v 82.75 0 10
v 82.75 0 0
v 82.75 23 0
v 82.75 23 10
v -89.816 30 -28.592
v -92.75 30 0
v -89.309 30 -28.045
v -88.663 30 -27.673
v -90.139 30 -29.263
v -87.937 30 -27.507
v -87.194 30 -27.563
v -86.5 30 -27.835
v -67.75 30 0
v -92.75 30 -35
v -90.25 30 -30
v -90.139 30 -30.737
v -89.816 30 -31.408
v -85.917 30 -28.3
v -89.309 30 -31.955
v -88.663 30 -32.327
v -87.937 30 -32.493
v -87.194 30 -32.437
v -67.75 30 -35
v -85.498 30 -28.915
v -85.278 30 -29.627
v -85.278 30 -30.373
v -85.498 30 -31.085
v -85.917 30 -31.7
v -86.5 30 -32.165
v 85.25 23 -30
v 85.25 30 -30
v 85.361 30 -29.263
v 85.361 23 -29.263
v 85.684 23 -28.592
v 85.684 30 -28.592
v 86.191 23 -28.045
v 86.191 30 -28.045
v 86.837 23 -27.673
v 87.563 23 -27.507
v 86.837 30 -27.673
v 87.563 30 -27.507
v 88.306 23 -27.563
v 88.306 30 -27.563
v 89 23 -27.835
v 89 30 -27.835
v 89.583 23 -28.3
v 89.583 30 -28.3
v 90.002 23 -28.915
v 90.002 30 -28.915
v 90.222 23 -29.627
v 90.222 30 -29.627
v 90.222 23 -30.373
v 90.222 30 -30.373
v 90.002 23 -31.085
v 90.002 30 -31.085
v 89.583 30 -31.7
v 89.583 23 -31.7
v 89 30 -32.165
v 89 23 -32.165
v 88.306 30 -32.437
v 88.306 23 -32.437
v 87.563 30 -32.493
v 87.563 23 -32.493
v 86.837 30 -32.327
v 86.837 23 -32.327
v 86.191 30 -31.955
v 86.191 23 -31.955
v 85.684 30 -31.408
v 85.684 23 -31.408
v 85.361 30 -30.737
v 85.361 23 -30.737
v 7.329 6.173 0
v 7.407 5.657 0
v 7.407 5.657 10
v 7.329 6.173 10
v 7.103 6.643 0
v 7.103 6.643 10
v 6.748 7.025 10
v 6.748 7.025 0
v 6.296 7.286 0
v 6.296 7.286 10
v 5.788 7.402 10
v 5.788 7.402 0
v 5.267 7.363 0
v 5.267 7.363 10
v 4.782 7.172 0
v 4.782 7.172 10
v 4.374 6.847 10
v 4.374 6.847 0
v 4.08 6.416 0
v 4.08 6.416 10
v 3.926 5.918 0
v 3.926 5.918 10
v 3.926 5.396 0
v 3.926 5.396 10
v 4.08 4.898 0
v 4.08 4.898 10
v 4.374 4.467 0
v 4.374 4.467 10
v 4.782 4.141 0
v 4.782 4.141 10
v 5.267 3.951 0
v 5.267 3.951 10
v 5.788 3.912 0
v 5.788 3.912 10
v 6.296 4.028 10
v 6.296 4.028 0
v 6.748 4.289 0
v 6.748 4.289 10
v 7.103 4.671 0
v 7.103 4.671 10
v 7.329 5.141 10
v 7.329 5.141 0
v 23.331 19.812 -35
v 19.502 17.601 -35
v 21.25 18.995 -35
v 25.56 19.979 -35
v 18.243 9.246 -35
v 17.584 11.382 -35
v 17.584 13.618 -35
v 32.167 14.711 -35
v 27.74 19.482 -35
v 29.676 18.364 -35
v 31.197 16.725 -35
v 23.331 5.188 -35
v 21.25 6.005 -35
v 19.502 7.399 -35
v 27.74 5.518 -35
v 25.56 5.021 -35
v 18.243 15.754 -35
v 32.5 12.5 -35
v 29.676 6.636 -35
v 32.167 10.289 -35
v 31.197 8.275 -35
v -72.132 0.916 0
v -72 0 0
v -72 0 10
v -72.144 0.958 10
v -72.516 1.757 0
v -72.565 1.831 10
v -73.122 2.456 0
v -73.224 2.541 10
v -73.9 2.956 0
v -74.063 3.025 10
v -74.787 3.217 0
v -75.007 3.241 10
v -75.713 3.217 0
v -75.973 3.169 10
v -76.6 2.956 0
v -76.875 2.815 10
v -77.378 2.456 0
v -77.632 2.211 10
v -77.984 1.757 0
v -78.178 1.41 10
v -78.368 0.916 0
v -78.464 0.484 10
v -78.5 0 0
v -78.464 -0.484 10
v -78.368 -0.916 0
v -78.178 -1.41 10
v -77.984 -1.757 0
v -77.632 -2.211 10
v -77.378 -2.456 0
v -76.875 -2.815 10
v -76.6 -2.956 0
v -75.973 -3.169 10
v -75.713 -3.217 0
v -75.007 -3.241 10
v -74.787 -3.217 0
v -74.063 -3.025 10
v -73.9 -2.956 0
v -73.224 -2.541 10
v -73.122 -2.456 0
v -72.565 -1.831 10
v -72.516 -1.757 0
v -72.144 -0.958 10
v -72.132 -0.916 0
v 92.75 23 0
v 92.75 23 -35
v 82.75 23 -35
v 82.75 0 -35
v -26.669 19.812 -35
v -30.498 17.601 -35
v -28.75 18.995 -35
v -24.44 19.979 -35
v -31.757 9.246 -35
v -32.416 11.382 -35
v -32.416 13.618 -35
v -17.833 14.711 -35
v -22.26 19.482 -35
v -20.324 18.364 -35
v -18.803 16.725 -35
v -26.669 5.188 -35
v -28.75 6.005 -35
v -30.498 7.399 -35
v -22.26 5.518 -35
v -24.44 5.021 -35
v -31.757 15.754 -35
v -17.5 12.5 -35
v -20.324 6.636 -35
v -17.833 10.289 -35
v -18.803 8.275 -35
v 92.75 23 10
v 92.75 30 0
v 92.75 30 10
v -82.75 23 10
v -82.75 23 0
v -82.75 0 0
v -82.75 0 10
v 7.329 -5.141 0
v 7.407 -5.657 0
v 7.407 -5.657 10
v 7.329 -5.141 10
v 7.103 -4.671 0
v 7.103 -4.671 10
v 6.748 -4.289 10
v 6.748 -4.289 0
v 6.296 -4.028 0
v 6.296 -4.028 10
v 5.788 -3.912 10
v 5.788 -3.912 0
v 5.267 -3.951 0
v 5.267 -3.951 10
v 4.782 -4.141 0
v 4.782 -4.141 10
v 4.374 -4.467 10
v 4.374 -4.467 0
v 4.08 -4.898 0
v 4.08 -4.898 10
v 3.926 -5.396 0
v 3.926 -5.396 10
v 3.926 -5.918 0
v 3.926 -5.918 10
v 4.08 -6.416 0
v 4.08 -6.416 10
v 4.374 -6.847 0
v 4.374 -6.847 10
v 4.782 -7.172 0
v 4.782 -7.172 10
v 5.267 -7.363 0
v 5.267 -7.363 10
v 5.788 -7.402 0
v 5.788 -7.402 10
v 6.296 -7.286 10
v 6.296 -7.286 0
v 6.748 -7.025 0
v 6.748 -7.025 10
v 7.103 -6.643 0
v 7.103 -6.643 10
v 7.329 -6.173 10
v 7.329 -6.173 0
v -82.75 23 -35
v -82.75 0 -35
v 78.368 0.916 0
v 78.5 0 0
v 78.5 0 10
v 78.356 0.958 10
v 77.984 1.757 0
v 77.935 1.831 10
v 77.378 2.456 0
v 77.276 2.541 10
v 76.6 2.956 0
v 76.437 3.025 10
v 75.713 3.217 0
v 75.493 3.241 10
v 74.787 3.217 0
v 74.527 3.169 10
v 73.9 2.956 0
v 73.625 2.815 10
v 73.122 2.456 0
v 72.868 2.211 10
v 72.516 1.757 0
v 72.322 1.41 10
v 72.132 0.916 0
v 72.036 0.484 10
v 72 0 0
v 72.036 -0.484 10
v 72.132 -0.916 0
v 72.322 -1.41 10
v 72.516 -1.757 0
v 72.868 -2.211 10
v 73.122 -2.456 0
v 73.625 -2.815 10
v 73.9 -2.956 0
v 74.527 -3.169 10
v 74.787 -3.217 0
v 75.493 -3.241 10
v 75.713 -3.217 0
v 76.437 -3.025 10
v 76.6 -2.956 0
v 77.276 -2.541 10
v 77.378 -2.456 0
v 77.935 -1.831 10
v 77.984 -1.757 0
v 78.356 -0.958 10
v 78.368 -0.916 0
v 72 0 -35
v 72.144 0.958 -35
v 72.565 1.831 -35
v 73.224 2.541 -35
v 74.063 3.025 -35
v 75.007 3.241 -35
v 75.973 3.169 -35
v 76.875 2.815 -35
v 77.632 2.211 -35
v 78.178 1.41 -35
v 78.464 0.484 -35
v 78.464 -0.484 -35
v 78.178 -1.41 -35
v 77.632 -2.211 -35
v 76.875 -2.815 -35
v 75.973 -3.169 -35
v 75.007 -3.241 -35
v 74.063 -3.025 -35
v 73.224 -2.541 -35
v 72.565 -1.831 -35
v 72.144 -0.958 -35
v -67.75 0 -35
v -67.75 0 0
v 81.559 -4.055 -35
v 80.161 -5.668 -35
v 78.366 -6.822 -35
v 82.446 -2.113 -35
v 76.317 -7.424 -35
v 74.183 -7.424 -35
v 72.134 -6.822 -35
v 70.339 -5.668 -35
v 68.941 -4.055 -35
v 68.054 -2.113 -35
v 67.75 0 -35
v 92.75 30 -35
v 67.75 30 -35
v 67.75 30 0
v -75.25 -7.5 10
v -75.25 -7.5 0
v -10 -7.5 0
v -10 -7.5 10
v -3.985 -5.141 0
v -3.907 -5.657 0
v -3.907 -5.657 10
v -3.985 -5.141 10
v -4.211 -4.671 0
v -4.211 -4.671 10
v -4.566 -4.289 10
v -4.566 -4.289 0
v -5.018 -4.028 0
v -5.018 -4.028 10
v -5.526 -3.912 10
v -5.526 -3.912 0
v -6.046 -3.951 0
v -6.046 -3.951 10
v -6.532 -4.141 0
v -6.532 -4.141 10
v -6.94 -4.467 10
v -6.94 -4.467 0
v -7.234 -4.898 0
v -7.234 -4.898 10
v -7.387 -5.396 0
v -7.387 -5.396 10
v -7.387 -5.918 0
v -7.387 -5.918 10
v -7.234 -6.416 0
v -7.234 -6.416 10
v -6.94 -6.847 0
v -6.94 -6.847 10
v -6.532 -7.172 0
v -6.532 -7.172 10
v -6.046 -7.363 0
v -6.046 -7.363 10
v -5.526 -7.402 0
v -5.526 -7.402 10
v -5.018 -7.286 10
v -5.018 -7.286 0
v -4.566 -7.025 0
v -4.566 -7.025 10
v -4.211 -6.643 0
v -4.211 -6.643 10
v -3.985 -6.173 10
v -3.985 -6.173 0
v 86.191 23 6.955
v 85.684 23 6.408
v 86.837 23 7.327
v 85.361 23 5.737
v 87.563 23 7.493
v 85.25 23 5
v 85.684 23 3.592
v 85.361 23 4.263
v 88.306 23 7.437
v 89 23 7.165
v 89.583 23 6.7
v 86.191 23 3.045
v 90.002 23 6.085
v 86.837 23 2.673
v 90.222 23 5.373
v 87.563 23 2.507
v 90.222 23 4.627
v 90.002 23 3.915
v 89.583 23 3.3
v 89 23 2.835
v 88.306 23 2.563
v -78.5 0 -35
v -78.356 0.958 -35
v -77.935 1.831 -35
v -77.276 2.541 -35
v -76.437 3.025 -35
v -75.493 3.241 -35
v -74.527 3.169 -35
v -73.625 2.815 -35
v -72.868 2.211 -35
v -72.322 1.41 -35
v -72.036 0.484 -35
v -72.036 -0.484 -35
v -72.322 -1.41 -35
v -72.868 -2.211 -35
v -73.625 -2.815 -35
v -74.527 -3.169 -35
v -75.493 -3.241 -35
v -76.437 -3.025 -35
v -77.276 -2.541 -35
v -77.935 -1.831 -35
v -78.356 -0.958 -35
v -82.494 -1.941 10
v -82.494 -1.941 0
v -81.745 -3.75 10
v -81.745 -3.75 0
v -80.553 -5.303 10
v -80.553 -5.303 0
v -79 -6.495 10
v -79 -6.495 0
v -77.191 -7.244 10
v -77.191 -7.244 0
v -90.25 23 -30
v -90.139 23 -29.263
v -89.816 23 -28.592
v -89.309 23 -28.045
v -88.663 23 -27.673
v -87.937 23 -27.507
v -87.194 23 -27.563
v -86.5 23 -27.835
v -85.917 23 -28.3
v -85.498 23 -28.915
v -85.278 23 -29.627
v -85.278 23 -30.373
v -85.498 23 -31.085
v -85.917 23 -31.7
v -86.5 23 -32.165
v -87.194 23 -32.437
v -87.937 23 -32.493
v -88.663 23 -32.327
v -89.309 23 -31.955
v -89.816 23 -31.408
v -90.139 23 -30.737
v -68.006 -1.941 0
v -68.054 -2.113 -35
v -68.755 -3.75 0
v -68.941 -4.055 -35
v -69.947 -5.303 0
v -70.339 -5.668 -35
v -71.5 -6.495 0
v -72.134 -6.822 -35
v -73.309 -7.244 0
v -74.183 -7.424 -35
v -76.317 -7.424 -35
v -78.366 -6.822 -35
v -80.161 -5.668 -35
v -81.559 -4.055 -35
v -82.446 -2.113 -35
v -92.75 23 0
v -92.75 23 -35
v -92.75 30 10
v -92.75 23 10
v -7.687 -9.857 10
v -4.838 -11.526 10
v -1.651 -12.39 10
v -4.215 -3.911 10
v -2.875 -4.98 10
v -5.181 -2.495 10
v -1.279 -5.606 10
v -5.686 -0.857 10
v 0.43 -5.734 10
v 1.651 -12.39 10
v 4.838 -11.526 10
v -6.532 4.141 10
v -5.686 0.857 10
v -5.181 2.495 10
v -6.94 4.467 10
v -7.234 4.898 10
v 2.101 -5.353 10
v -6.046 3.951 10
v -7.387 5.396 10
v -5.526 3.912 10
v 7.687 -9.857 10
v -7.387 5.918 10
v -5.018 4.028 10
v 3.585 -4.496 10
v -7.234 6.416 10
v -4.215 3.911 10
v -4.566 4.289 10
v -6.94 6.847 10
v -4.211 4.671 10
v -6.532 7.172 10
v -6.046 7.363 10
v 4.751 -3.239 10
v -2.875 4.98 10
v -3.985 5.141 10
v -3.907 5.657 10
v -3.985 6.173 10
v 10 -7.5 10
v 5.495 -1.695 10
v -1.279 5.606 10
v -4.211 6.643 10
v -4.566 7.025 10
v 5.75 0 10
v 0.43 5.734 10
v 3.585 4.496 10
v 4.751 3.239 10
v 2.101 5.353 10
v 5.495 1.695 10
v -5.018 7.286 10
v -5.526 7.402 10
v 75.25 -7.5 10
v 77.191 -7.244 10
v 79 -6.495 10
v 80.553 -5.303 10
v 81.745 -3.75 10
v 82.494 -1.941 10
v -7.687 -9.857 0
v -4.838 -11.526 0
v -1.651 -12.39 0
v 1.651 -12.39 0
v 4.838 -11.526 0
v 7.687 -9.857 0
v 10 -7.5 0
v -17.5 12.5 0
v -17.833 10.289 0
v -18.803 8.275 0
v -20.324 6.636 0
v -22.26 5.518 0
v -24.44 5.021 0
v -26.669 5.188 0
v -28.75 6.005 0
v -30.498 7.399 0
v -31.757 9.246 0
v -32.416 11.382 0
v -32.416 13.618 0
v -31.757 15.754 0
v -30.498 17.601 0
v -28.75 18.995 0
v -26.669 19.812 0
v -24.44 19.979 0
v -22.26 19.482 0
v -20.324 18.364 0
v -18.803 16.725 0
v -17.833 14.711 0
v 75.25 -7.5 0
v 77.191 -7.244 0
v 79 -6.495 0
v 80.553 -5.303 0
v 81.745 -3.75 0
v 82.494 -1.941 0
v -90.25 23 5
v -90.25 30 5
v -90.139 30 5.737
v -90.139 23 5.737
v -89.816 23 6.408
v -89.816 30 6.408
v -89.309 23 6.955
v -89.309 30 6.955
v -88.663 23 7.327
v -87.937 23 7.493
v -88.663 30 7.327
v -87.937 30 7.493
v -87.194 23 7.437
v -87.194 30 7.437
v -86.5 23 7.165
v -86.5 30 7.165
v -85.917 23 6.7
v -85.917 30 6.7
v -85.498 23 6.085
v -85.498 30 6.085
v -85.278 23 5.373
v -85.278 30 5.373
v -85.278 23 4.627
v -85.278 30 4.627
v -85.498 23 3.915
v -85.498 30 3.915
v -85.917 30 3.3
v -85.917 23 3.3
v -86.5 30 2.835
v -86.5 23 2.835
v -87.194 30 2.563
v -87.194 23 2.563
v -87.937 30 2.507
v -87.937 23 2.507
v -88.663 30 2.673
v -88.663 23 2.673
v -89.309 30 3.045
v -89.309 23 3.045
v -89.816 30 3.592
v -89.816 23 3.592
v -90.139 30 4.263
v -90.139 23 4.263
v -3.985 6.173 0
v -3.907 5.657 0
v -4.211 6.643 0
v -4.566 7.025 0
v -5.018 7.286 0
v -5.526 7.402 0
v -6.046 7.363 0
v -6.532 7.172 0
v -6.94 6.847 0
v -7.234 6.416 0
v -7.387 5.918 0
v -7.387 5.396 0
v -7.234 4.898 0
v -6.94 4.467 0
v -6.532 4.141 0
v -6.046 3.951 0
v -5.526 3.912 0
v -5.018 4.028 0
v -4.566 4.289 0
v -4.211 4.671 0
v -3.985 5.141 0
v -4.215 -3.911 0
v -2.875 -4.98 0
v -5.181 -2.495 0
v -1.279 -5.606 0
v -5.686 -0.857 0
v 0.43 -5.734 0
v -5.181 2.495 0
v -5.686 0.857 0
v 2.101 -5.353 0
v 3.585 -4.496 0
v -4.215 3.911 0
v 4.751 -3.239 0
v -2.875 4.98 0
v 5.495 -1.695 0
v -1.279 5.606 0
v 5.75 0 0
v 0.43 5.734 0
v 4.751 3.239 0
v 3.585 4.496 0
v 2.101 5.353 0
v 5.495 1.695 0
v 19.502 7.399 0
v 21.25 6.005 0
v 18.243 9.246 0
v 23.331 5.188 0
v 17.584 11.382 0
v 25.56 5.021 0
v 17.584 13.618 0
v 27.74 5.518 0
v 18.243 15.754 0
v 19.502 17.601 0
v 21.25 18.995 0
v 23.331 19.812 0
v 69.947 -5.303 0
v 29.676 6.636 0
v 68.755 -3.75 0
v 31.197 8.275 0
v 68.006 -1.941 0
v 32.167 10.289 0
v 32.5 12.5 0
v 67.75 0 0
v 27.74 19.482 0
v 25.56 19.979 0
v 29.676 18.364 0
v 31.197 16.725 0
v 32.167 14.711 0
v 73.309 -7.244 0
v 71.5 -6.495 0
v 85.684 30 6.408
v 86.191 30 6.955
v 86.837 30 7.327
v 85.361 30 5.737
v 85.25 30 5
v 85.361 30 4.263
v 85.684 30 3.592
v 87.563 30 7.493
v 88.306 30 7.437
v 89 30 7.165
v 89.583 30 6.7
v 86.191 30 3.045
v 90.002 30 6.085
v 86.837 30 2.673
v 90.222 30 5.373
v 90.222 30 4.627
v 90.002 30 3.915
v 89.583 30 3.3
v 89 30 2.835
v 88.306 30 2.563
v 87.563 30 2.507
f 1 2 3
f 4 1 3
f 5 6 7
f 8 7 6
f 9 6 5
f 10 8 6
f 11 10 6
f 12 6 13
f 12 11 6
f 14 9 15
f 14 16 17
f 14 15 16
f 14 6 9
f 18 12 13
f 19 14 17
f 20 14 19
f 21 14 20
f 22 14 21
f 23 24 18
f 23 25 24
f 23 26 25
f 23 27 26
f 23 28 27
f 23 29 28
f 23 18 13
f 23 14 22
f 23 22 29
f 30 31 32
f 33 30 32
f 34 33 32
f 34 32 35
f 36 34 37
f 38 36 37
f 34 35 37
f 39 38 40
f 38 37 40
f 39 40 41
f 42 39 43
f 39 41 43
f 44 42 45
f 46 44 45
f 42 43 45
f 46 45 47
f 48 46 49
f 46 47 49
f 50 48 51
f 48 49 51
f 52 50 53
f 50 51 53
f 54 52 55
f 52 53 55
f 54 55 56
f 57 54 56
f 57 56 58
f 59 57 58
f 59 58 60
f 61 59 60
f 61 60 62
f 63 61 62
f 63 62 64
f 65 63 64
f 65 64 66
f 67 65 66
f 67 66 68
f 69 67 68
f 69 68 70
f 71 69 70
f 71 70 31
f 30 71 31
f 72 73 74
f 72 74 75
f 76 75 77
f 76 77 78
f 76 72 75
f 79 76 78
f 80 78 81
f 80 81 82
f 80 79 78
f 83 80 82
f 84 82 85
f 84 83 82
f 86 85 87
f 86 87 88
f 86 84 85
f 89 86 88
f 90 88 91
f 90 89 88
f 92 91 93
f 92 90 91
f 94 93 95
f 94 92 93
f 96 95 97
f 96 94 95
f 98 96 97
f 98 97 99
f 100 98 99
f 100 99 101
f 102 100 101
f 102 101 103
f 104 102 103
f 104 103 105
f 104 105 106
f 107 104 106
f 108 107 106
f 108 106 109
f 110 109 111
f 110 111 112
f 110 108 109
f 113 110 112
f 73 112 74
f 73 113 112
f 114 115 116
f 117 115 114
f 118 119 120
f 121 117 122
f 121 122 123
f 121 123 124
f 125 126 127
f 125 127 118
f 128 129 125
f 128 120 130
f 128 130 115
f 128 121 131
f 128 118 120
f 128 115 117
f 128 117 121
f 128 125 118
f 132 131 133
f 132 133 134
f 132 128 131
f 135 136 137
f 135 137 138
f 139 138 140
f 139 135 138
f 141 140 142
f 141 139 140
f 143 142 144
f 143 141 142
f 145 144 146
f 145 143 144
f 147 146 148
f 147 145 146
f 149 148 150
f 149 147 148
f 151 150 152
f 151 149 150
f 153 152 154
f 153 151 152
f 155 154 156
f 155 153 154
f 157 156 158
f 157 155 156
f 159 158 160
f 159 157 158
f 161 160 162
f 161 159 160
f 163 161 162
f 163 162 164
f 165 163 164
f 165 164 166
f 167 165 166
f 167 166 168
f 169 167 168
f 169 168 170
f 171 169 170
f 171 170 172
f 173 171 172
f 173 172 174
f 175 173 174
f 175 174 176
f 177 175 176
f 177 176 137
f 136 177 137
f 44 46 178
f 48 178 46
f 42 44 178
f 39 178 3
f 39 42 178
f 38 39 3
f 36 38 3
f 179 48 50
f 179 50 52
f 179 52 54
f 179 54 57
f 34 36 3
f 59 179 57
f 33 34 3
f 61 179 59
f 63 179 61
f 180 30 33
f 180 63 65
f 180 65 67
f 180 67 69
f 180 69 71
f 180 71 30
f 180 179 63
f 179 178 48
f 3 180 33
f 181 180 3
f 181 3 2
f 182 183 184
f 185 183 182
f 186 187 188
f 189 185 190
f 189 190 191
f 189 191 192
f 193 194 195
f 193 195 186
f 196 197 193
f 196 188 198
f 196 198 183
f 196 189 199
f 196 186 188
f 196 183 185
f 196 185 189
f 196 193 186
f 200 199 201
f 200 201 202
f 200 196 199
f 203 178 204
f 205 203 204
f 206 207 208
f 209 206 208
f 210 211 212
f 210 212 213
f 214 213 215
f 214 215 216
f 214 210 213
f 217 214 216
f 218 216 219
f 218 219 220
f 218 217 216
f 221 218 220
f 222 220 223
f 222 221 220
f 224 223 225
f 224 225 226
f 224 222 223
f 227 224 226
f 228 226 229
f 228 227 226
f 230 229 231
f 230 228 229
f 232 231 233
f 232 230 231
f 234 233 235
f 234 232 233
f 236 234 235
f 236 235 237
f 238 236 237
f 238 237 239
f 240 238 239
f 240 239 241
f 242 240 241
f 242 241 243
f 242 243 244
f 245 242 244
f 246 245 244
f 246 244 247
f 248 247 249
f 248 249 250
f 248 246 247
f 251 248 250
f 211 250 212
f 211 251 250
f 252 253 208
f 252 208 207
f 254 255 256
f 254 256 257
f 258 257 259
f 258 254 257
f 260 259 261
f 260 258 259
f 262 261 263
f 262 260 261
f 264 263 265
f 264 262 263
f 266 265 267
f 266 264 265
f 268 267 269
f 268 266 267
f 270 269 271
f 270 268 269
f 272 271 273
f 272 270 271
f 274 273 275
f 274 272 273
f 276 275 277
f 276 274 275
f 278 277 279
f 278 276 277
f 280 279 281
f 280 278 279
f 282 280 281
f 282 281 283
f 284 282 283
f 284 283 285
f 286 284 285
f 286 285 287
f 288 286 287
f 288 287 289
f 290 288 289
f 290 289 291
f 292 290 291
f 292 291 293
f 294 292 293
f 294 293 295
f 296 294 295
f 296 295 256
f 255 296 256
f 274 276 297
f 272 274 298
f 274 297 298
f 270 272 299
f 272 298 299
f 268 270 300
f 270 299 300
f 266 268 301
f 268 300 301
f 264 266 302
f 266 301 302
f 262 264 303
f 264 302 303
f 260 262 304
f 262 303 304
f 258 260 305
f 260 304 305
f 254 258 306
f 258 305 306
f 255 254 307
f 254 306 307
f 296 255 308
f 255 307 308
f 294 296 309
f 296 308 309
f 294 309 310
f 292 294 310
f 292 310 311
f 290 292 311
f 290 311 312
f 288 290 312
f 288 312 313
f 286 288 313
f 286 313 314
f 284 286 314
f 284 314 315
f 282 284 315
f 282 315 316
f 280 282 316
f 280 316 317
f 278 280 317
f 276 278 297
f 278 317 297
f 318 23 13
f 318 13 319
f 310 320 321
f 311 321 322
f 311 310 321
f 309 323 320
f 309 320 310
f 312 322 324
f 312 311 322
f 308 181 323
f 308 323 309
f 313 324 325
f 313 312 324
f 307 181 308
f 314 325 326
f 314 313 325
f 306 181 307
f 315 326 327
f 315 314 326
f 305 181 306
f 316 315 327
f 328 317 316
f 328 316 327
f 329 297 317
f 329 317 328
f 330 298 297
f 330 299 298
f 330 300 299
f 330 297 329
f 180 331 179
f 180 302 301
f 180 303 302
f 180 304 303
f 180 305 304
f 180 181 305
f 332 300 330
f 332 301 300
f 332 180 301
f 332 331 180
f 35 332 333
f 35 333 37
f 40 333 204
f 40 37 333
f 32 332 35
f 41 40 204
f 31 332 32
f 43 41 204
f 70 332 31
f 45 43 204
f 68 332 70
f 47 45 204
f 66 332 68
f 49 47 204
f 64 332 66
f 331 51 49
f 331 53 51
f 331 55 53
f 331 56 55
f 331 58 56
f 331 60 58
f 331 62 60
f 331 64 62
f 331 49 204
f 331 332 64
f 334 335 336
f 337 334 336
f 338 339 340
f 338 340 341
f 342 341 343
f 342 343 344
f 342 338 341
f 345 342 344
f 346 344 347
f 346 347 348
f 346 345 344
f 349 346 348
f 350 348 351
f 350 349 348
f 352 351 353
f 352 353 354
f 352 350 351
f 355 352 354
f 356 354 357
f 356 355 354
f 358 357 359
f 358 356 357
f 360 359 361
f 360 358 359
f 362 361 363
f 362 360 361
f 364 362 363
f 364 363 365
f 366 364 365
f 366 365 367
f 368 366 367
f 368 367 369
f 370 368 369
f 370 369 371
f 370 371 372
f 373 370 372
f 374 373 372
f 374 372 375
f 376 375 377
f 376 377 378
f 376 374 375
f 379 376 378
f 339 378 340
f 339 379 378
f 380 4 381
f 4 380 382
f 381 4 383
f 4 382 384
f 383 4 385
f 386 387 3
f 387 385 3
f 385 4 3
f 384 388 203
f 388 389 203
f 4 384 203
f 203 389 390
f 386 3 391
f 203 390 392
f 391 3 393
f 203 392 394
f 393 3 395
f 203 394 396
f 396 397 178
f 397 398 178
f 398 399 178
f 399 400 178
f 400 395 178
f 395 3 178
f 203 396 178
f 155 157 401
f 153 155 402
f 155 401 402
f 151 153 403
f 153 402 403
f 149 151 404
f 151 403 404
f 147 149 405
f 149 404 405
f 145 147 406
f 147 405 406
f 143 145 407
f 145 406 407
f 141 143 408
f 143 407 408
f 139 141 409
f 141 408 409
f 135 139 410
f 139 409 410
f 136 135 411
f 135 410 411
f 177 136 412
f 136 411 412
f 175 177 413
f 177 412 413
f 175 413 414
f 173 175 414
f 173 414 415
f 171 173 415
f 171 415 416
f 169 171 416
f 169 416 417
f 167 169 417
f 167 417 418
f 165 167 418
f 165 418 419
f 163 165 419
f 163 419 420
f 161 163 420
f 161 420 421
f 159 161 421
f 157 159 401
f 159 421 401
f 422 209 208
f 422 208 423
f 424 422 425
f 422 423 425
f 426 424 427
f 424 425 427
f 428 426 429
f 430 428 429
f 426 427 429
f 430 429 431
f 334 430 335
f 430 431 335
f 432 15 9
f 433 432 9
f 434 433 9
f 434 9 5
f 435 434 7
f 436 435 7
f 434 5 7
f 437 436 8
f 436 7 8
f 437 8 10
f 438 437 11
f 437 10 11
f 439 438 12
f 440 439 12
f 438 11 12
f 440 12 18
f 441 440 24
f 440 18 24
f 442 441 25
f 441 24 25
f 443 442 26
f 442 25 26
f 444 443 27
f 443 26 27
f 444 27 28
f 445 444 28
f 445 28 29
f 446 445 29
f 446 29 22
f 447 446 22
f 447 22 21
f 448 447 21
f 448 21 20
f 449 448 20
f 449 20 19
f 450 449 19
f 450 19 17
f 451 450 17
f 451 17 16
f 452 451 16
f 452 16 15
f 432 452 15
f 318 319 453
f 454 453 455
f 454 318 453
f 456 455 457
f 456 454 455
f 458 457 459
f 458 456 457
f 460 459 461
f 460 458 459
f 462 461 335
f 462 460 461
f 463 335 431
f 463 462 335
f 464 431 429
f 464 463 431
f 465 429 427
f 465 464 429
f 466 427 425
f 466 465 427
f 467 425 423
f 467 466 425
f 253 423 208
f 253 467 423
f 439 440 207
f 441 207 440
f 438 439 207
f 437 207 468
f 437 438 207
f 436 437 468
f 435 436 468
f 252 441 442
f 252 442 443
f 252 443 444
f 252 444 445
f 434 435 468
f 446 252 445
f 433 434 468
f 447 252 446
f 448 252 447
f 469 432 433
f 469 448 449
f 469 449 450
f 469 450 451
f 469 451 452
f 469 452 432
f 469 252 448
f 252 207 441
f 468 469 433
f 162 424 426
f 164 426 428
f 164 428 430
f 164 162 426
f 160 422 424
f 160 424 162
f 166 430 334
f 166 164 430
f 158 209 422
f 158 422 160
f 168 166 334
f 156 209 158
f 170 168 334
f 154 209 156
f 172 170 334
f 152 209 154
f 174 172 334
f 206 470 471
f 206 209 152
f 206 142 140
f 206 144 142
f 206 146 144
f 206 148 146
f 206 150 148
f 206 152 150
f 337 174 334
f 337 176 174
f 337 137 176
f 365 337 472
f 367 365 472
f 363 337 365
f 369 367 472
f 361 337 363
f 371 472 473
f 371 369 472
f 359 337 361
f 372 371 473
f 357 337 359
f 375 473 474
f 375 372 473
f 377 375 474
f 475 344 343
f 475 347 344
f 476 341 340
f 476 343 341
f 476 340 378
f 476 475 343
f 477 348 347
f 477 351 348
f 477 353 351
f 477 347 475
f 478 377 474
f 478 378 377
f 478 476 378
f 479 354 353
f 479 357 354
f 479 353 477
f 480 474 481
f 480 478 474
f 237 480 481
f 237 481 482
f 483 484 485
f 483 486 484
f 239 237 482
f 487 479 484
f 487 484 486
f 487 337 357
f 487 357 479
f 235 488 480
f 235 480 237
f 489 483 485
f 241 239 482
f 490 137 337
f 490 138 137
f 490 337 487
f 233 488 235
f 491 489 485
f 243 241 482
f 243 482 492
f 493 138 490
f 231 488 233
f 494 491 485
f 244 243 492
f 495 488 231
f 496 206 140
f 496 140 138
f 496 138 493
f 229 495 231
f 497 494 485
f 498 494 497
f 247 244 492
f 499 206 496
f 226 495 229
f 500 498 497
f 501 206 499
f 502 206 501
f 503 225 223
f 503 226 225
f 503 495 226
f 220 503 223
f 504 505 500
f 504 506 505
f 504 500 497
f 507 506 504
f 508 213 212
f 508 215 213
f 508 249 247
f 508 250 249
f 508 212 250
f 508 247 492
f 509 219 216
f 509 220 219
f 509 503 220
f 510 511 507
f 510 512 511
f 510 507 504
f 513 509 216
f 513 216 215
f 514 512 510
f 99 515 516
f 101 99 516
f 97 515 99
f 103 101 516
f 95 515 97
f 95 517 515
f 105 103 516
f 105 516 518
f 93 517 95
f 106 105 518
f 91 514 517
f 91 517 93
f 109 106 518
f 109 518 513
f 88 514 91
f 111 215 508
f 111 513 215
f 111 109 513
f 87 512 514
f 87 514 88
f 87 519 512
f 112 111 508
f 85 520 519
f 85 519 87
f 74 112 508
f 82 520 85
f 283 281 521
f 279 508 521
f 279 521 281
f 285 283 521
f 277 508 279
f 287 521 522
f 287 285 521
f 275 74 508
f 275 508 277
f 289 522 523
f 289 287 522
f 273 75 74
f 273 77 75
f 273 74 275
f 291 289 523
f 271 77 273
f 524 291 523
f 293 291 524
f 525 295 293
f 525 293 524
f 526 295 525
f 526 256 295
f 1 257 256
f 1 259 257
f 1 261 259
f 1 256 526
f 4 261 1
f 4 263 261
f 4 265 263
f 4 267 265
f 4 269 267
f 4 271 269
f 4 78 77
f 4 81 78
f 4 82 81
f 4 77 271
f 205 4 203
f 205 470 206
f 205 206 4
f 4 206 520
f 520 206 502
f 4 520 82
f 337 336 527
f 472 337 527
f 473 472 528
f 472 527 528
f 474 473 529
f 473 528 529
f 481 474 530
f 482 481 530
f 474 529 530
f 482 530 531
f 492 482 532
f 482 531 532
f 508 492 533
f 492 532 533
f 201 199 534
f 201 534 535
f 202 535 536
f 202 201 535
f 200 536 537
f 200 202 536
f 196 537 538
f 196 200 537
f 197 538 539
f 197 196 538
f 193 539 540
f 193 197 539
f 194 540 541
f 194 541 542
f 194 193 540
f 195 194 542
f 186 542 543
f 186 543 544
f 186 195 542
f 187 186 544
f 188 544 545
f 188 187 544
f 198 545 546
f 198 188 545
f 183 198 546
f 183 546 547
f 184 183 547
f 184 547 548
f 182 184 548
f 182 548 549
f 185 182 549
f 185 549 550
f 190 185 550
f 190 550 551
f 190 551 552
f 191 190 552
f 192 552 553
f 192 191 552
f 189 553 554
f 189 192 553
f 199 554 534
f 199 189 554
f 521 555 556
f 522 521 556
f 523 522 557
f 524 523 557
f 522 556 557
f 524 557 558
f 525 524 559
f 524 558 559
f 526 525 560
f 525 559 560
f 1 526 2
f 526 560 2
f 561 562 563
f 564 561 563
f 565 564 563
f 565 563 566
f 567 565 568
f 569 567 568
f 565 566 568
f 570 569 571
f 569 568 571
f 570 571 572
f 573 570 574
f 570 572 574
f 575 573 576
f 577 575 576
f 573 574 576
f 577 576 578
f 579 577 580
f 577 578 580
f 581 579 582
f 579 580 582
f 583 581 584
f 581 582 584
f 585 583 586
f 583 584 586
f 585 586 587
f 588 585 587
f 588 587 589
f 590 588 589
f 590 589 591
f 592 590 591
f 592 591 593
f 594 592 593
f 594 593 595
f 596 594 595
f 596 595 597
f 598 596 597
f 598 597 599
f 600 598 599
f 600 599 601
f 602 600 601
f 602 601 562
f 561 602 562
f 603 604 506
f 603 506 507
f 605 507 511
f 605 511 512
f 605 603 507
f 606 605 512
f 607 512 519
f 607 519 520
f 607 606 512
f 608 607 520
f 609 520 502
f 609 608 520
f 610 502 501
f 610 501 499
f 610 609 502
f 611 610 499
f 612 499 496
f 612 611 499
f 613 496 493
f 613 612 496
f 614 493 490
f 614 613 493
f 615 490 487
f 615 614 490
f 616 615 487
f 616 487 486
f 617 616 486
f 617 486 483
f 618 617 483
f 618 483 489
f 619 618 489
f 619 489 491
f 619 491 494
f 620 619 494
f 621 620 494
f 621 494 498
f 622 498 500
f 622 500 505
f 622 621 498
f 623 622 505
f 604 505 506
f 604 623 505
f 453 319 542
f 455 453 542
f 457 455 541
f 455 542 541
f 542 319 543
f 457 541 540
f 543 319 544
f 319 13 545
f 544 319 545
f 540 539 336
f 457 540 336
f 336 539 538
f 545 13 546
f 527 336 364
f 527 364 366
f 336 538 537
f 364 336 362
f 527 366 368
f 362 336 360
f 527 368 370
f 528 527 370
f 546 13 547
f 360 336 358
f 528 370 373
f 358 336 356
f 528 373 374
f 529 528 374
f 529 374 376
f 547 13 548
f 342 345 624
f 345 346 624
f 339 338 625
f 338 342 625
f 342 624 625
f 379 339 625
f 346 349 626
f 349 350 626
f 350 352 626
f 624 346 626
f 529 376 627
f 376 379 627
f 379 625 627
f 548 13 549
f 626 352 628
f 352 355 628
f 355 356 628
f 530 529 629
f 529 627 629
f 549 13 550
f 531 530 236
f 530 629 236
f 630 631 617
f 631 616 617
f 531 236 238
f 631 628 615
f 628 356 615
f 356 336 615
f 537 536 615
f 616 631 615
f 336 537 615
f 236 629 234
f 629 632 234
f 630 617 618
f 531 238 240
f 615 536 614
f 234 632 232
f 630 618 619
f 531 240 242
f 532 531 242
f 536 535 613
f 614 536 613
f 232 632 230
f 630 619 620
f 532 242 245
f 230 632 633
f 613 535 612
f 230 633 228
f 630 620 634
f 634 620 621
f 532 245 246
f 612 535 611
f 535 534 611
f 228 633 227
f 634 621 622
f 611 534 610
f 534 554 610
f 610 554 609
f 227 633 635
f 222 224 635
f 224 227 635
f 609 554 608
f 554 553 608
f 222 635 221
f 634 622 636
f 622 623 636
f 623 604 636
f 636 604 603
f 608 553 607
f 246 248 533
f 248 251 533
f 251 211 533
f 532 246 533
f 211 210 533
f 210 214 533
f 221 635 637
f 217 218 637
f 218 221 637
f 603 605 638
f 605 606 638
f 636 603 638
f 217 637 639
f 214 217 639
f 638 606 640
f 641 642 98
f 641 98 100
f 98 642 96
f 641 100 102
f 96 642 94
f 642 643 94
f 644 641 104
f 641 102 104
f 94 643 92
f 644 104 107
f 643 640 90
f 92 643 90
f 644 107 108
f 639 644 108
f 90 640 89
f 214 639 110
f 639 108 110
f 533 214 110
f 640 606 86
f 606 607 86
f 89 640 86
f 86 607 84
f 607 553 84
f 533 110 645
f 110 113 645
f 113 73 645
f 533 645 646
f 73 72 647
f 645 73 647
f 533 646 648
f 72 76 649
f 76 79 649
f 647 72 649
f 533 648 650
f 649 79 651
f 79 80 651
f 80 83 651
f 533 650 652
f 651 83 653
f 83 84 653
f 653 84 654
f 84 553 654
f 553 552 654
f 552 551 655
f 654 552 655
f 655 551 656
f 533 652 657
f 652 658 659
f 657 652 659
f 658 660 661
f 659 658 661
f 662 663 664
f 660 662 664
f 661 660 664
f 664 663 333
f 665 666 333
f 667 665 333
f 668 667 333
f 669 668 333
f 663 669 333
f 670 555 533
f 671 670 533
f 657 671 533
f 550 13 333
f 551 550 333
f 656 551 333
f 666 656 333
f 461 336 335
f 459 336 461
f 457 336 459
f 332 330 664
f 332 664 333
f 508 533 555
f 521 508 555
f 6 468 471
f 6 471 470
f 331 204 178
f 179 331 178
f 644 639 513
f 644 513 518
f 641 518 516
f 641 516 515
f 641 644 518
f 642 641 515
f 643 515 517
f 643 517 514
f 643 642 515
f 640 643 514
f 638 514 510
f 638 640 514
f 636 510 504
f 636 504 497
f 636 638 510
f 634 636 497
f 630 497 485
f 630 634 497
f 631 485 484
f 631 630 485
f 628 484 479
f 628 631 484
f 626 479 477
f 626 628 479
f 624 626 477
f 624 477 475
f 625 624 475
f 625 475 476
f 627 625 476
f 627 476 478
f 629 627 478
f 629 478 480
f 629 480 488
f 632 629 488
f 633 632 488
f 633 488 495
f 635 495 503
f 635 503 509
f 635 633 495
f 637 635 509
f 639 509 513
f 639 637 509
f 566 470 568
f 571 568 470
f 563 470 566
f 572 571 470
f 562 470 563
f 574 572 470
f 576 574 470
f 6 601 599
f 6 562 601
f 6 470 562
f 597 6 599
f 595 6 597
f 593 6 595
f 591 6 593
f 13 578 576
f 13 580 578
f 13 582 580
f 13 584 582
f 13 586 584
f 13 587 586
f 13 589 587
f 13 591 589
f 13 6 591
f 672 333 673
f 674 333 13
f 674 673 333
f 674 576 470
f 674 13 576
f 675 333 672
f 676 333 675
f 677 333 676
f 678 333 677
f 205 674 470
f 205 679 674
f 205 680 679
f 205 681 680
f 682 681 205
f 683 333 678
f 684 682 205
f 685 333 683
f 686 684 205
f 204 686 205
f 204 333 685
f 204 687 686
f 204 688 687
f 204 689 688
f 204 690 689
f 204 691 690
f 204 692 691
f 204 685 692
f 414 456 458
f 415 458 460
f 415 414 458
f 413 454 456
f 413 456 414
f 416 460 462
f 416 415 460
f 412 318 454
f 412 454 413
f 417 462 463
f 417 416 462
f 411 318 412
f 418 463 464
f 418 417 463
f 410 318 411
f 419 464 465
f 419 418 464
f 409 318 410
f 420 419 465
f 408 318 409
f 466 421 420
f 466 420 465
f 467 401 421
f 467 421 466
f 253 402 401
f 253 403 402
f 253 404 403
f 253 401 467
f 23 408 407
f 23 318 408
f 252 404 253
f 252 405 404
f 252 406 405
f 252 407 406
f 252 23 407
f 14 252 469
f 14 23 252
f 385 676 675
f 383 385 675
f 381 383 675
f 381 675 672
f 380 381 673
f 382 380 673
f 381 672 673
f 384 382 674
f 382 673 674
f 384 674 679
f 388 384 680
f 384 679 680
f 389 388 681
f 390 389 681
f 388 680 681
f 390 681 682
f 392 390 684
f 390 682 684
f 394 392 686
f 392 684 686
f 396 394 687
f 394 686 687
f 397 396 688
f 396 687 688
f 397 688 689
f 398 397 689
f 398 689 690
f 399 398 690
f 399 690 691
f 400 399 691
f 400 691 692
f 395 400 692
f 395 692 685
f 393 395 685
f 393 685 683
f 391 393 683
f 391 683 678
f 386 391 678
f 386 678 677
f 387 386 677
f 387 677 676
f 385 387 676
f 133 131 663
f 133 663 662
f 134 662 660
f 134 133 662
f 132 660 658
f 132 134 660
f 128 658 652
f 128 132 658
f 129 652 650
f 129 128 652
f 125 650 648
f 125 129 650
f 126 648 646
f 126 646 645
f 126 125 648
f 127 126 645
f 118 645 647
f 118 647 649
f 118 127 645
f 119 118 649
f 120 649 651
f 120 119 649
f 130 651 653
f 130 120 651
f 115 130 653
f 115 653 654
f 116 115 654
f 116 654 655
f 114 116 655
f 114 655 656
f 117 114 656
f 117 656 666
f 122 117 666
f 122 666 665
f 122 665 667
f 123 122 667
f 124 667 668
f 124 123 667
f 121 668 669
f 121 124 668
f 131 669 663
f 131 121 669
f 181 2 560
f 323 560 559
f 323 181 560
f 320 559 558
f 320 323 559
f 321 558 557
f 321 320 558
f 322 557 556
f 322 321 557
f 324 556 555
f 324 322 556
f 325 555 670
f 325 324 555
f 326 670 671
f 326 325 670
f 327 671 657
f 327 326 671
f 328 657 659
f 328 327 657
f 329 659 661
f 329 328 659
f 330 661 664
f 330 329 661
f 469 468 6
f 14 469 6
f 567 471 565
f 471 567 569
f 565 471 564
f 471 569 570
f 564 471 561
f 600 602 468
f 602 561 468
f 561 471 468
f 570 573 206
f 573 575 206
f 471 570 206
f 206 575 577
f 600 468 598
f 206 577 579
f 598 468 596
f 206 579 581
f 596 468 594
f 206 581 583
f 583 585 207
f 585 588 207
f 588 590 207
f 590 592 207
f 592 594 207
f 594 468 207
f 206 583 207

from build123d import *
from build123d.topology import SkipClean

# Parameters (mm, degrees)
SKETCH1_R           = 12.5
SKETCH1_R_2         = 1.75
SKETCH1_R_3         = 5.75
SKETCH1_R_4         = 7.5
SKETCH1_R_5         = 3.25
SKETCH1_W           = 10
SKETCH1_H           = 7
BOSS_EXTRUDE1_DEPTH = 10
BOSS_EXTRUDE2_START = 35
SKETCH2_R           = 3.25
SKETCH2_R_2         = 7.5
BOSS_EXTRUDE2_DEPTH = 35
SKETCH3_R           = 2.5
CUT_EXTRUDE1_DEPTH  = 35


with BuildPart() as part:
    # Sketch1 → Boss-Extrude1 (new body)
    # profile 1 of 8: a face of its own
    with BuildSketch(Plane.XY):
        with BuildLine():
            Line((-12.5, 30), (-12.5, 0))
            ThreePointArc((-12.5, 0), (0, 12.5), (12.5, 0))
            Line((12.5, 0), (12.5, 30))
            Line((12.5, 30), (-12.5, 30))
        make_face()
    # profile 2 of 8: a face of its own
    with BuildSketch(Plane.XY):
        Circle(SKETCH1_R)
        with Locations((-5.656854249, -5.656854249)):
            Circle(SKETCH1_R_2, mode=Mode.SUBTRACT)
        with Locations((5.656854249, -5.656854249)):
            Circle(SKETCH1_R_2, mode=Mode.SUBTRACT)
        with Locations((5.656854249, 5.656854249)):
            Circle(SKETCH1_R_2, mode=Mode.SUBTRACT)
        with Locations((-5.656854249, 5.656854249)):
            Circle(SKETCH1_R_2, mode=Mode.SUBTRACT)
        Circle(SKETCH1_R_3, mode=Mode.SUBTRACT)
    # profile 3 of 8: a face of its own
    with BuildSketch(Plane.XY):
        with Locations((-75.25, 0)):
            Circle(SKETCH1_R_4)
        with Locations((-75.25, 0)):
            Circle(SKETCH1_R_5, mode=Mode.SUBTRACT)
    # profile 4 of 8: a face of its own
    with BuildSketch(Plane.XY):
        with Locations((75.25, 0)):
            Circle(SKETCH1_R_4)
        with Locations((75.25, 0)):
            Circle(SKETCH1_R_5, mode=Mode.SUBTRACT)
    # profile 5 of 8: a face of its own
    with BuildSketch(Plane.XY):
        with BuildLine():
            Line((12.5, 30), (12.5, 0))
            ThreePointArc((12.5, 0), (11.858541226, -3.952847075), (10, -7.5))
            Line((10, -7.5), (75.25, -7.5))
            ThreePointArc((75.25, -7.5), (69.946699141, 5.303300859), (82.75, 0))
            Line((82.75, 0), (82.75, 23))
            Line((82.75, 23), (82.75, 30))
            Line((82.75, 30), (12.5, 30))
        make_face()
    # profile 6 of 8: a face of its own
    with BuildSketch(Plane.XY):
        with BuildLine():
            ThreePointArc((-10, -7.5), (-11.858541226, -3.952847075), (-12.5, 0))
            Line((-12.5, 0), (-12.5, 30))
            Line((-12.5, 30), (-82.75, 30))
            Line((-82.75, 30), (-82.75, 23))
            Line((-82.75, 23), (-82.75, 0))
            ThreePointArc((-82.75, 0), (-75.25, 7.5), (-67.75, 0))
            ThreePointArc((-67.75, 0), (-69.946699141, -5.303300859), (-75.25, -7.5))
            Line((-75.25, -7.5), (-10, -7.5))
        make_face()
    # profile 7 of 8: a face of its own
    with BuildSketch(Plane.XY):
        with Locations((-87.75, 26.5)):
            Rectangle(SKETCH1_W, SKETCH1_H)
    # profile 8 of 8: a face of its own
    with BuildSketch(Plane.XY):
        with Locations((87.75, 26.5)):
            Rectangle(SKETCH1_W, SKETCH1_H)
    extrude(amount=BOSS_EXTRUDE1_DEPTH)

    # Sketch2 → Boss-Extrude2 (add)
    # profile 1 of 4: a face of its own
    with SkipClean():  # the faces are left unmerged after this step: merging them gives an invalid solid
        with BuildSketch(Plane(origin=(0, 0, 0), x_dir=(-1, 0, 0), z_dir=(0, 0, -1)).offset(BOSS_EXTRUDE2_START)):
            with BuildLine():
                Line((-82.75, 23), (-82.75, 0))
                ThreePointArc((-82.75, 0), (-75.25, -7.5), (-67.75, 0))
                Line((-67.75, 0), (-67.75, 30))
                Line((-67.75, 30), (-92.75, 30))
                Line((-92.75, 30), (-92.75, 23))
                Line((-92.75, 23), (-82.75, 23))
            make_face()
            with Locations((-75.25, 0)):
                Circle(SKETCH2_R, mode=Mode.SUBTRACT)
        # profile 2 of 4: a face of its own
        with BuildSketch(Plane(origin=(0, 0, 0), x_dir=(-1, 0, 0), z_dir=(0, 0, -1)).offset(BOSS_EXTRUDE2_START)):
            with BuildLine():
                Line((92.75, 30), (67.75, 30))
                Line((67.75, 30), (67.75, 0))
                ThreePointArc((67.75, 0), (75.25, -7.5), (82.75, 0))
                Line((82.75, 0), (82.75, 23))
                Line((82.75, 23), (92.75, 23))
                Line((92.75, 23), (92.75, 30))
            make_face()
            with Locations((75.25, 0)):
                Circle(SKETCH2_R, mode=Mode.SUBTRACT)
        # profile 3 of 4: a face of its own
        with BuildSketch(Plane(origin=(0, 0, 0), x_dir=(-1, 0, 0), z_dir=(0, 0, -1)).offset(BOSS_EXTRUDE2_START)):
            with Locations(Location((-25, 12.5, 0), (0, 0, 180))):
                Circle(SKETCH2_R_2)
        # profile 4 of 4: a face of its own
        with BuildSketch(Plane(origin=(0, 0, 0), x_dir=(-1, 0, 0), z_dir=(0, 0, -1)).offset(BOSS_EXTRUDE2_START)):
            with Locations(Location((25, 12.5, 0), (0, 0, 180))):
                Circle(SKETCH2_R_2)
        extrude(amount=-BOSS_EXTRUDE2_DEPTH)

    # Sketch3 → Cut-Extrude1 (cut)
    with SkipClean():  # the faces are left unmerged after this step: merging them gives an invalid solid
        with BuildSketch(Plane(origin=(0, 30, 0), x_dir=(1, 0, 0), z_dir=(0, 1, 0))):
            with Locations(Location((-87.75, 30, 0), (0, 0, 180))):
                Circle(SKETCH3_R)
            with Locations(Location((-87.75, -5, 0), (0, 0, 180))):
                Circle(SKETCH3_R)
            with Locations(Location((87.75, 30, 0), (0, 0, 180))):
                Circle(SKETCH3_R)
            with Locations(Location((87.75, -5, 0), (0, 0, 180))):
                Circle(SKETCH3_R)
        extrude(amount=-CUT_EXTRUDE1_DEPTH, mode=Mode.SUBTRACT)


solid = part.part
